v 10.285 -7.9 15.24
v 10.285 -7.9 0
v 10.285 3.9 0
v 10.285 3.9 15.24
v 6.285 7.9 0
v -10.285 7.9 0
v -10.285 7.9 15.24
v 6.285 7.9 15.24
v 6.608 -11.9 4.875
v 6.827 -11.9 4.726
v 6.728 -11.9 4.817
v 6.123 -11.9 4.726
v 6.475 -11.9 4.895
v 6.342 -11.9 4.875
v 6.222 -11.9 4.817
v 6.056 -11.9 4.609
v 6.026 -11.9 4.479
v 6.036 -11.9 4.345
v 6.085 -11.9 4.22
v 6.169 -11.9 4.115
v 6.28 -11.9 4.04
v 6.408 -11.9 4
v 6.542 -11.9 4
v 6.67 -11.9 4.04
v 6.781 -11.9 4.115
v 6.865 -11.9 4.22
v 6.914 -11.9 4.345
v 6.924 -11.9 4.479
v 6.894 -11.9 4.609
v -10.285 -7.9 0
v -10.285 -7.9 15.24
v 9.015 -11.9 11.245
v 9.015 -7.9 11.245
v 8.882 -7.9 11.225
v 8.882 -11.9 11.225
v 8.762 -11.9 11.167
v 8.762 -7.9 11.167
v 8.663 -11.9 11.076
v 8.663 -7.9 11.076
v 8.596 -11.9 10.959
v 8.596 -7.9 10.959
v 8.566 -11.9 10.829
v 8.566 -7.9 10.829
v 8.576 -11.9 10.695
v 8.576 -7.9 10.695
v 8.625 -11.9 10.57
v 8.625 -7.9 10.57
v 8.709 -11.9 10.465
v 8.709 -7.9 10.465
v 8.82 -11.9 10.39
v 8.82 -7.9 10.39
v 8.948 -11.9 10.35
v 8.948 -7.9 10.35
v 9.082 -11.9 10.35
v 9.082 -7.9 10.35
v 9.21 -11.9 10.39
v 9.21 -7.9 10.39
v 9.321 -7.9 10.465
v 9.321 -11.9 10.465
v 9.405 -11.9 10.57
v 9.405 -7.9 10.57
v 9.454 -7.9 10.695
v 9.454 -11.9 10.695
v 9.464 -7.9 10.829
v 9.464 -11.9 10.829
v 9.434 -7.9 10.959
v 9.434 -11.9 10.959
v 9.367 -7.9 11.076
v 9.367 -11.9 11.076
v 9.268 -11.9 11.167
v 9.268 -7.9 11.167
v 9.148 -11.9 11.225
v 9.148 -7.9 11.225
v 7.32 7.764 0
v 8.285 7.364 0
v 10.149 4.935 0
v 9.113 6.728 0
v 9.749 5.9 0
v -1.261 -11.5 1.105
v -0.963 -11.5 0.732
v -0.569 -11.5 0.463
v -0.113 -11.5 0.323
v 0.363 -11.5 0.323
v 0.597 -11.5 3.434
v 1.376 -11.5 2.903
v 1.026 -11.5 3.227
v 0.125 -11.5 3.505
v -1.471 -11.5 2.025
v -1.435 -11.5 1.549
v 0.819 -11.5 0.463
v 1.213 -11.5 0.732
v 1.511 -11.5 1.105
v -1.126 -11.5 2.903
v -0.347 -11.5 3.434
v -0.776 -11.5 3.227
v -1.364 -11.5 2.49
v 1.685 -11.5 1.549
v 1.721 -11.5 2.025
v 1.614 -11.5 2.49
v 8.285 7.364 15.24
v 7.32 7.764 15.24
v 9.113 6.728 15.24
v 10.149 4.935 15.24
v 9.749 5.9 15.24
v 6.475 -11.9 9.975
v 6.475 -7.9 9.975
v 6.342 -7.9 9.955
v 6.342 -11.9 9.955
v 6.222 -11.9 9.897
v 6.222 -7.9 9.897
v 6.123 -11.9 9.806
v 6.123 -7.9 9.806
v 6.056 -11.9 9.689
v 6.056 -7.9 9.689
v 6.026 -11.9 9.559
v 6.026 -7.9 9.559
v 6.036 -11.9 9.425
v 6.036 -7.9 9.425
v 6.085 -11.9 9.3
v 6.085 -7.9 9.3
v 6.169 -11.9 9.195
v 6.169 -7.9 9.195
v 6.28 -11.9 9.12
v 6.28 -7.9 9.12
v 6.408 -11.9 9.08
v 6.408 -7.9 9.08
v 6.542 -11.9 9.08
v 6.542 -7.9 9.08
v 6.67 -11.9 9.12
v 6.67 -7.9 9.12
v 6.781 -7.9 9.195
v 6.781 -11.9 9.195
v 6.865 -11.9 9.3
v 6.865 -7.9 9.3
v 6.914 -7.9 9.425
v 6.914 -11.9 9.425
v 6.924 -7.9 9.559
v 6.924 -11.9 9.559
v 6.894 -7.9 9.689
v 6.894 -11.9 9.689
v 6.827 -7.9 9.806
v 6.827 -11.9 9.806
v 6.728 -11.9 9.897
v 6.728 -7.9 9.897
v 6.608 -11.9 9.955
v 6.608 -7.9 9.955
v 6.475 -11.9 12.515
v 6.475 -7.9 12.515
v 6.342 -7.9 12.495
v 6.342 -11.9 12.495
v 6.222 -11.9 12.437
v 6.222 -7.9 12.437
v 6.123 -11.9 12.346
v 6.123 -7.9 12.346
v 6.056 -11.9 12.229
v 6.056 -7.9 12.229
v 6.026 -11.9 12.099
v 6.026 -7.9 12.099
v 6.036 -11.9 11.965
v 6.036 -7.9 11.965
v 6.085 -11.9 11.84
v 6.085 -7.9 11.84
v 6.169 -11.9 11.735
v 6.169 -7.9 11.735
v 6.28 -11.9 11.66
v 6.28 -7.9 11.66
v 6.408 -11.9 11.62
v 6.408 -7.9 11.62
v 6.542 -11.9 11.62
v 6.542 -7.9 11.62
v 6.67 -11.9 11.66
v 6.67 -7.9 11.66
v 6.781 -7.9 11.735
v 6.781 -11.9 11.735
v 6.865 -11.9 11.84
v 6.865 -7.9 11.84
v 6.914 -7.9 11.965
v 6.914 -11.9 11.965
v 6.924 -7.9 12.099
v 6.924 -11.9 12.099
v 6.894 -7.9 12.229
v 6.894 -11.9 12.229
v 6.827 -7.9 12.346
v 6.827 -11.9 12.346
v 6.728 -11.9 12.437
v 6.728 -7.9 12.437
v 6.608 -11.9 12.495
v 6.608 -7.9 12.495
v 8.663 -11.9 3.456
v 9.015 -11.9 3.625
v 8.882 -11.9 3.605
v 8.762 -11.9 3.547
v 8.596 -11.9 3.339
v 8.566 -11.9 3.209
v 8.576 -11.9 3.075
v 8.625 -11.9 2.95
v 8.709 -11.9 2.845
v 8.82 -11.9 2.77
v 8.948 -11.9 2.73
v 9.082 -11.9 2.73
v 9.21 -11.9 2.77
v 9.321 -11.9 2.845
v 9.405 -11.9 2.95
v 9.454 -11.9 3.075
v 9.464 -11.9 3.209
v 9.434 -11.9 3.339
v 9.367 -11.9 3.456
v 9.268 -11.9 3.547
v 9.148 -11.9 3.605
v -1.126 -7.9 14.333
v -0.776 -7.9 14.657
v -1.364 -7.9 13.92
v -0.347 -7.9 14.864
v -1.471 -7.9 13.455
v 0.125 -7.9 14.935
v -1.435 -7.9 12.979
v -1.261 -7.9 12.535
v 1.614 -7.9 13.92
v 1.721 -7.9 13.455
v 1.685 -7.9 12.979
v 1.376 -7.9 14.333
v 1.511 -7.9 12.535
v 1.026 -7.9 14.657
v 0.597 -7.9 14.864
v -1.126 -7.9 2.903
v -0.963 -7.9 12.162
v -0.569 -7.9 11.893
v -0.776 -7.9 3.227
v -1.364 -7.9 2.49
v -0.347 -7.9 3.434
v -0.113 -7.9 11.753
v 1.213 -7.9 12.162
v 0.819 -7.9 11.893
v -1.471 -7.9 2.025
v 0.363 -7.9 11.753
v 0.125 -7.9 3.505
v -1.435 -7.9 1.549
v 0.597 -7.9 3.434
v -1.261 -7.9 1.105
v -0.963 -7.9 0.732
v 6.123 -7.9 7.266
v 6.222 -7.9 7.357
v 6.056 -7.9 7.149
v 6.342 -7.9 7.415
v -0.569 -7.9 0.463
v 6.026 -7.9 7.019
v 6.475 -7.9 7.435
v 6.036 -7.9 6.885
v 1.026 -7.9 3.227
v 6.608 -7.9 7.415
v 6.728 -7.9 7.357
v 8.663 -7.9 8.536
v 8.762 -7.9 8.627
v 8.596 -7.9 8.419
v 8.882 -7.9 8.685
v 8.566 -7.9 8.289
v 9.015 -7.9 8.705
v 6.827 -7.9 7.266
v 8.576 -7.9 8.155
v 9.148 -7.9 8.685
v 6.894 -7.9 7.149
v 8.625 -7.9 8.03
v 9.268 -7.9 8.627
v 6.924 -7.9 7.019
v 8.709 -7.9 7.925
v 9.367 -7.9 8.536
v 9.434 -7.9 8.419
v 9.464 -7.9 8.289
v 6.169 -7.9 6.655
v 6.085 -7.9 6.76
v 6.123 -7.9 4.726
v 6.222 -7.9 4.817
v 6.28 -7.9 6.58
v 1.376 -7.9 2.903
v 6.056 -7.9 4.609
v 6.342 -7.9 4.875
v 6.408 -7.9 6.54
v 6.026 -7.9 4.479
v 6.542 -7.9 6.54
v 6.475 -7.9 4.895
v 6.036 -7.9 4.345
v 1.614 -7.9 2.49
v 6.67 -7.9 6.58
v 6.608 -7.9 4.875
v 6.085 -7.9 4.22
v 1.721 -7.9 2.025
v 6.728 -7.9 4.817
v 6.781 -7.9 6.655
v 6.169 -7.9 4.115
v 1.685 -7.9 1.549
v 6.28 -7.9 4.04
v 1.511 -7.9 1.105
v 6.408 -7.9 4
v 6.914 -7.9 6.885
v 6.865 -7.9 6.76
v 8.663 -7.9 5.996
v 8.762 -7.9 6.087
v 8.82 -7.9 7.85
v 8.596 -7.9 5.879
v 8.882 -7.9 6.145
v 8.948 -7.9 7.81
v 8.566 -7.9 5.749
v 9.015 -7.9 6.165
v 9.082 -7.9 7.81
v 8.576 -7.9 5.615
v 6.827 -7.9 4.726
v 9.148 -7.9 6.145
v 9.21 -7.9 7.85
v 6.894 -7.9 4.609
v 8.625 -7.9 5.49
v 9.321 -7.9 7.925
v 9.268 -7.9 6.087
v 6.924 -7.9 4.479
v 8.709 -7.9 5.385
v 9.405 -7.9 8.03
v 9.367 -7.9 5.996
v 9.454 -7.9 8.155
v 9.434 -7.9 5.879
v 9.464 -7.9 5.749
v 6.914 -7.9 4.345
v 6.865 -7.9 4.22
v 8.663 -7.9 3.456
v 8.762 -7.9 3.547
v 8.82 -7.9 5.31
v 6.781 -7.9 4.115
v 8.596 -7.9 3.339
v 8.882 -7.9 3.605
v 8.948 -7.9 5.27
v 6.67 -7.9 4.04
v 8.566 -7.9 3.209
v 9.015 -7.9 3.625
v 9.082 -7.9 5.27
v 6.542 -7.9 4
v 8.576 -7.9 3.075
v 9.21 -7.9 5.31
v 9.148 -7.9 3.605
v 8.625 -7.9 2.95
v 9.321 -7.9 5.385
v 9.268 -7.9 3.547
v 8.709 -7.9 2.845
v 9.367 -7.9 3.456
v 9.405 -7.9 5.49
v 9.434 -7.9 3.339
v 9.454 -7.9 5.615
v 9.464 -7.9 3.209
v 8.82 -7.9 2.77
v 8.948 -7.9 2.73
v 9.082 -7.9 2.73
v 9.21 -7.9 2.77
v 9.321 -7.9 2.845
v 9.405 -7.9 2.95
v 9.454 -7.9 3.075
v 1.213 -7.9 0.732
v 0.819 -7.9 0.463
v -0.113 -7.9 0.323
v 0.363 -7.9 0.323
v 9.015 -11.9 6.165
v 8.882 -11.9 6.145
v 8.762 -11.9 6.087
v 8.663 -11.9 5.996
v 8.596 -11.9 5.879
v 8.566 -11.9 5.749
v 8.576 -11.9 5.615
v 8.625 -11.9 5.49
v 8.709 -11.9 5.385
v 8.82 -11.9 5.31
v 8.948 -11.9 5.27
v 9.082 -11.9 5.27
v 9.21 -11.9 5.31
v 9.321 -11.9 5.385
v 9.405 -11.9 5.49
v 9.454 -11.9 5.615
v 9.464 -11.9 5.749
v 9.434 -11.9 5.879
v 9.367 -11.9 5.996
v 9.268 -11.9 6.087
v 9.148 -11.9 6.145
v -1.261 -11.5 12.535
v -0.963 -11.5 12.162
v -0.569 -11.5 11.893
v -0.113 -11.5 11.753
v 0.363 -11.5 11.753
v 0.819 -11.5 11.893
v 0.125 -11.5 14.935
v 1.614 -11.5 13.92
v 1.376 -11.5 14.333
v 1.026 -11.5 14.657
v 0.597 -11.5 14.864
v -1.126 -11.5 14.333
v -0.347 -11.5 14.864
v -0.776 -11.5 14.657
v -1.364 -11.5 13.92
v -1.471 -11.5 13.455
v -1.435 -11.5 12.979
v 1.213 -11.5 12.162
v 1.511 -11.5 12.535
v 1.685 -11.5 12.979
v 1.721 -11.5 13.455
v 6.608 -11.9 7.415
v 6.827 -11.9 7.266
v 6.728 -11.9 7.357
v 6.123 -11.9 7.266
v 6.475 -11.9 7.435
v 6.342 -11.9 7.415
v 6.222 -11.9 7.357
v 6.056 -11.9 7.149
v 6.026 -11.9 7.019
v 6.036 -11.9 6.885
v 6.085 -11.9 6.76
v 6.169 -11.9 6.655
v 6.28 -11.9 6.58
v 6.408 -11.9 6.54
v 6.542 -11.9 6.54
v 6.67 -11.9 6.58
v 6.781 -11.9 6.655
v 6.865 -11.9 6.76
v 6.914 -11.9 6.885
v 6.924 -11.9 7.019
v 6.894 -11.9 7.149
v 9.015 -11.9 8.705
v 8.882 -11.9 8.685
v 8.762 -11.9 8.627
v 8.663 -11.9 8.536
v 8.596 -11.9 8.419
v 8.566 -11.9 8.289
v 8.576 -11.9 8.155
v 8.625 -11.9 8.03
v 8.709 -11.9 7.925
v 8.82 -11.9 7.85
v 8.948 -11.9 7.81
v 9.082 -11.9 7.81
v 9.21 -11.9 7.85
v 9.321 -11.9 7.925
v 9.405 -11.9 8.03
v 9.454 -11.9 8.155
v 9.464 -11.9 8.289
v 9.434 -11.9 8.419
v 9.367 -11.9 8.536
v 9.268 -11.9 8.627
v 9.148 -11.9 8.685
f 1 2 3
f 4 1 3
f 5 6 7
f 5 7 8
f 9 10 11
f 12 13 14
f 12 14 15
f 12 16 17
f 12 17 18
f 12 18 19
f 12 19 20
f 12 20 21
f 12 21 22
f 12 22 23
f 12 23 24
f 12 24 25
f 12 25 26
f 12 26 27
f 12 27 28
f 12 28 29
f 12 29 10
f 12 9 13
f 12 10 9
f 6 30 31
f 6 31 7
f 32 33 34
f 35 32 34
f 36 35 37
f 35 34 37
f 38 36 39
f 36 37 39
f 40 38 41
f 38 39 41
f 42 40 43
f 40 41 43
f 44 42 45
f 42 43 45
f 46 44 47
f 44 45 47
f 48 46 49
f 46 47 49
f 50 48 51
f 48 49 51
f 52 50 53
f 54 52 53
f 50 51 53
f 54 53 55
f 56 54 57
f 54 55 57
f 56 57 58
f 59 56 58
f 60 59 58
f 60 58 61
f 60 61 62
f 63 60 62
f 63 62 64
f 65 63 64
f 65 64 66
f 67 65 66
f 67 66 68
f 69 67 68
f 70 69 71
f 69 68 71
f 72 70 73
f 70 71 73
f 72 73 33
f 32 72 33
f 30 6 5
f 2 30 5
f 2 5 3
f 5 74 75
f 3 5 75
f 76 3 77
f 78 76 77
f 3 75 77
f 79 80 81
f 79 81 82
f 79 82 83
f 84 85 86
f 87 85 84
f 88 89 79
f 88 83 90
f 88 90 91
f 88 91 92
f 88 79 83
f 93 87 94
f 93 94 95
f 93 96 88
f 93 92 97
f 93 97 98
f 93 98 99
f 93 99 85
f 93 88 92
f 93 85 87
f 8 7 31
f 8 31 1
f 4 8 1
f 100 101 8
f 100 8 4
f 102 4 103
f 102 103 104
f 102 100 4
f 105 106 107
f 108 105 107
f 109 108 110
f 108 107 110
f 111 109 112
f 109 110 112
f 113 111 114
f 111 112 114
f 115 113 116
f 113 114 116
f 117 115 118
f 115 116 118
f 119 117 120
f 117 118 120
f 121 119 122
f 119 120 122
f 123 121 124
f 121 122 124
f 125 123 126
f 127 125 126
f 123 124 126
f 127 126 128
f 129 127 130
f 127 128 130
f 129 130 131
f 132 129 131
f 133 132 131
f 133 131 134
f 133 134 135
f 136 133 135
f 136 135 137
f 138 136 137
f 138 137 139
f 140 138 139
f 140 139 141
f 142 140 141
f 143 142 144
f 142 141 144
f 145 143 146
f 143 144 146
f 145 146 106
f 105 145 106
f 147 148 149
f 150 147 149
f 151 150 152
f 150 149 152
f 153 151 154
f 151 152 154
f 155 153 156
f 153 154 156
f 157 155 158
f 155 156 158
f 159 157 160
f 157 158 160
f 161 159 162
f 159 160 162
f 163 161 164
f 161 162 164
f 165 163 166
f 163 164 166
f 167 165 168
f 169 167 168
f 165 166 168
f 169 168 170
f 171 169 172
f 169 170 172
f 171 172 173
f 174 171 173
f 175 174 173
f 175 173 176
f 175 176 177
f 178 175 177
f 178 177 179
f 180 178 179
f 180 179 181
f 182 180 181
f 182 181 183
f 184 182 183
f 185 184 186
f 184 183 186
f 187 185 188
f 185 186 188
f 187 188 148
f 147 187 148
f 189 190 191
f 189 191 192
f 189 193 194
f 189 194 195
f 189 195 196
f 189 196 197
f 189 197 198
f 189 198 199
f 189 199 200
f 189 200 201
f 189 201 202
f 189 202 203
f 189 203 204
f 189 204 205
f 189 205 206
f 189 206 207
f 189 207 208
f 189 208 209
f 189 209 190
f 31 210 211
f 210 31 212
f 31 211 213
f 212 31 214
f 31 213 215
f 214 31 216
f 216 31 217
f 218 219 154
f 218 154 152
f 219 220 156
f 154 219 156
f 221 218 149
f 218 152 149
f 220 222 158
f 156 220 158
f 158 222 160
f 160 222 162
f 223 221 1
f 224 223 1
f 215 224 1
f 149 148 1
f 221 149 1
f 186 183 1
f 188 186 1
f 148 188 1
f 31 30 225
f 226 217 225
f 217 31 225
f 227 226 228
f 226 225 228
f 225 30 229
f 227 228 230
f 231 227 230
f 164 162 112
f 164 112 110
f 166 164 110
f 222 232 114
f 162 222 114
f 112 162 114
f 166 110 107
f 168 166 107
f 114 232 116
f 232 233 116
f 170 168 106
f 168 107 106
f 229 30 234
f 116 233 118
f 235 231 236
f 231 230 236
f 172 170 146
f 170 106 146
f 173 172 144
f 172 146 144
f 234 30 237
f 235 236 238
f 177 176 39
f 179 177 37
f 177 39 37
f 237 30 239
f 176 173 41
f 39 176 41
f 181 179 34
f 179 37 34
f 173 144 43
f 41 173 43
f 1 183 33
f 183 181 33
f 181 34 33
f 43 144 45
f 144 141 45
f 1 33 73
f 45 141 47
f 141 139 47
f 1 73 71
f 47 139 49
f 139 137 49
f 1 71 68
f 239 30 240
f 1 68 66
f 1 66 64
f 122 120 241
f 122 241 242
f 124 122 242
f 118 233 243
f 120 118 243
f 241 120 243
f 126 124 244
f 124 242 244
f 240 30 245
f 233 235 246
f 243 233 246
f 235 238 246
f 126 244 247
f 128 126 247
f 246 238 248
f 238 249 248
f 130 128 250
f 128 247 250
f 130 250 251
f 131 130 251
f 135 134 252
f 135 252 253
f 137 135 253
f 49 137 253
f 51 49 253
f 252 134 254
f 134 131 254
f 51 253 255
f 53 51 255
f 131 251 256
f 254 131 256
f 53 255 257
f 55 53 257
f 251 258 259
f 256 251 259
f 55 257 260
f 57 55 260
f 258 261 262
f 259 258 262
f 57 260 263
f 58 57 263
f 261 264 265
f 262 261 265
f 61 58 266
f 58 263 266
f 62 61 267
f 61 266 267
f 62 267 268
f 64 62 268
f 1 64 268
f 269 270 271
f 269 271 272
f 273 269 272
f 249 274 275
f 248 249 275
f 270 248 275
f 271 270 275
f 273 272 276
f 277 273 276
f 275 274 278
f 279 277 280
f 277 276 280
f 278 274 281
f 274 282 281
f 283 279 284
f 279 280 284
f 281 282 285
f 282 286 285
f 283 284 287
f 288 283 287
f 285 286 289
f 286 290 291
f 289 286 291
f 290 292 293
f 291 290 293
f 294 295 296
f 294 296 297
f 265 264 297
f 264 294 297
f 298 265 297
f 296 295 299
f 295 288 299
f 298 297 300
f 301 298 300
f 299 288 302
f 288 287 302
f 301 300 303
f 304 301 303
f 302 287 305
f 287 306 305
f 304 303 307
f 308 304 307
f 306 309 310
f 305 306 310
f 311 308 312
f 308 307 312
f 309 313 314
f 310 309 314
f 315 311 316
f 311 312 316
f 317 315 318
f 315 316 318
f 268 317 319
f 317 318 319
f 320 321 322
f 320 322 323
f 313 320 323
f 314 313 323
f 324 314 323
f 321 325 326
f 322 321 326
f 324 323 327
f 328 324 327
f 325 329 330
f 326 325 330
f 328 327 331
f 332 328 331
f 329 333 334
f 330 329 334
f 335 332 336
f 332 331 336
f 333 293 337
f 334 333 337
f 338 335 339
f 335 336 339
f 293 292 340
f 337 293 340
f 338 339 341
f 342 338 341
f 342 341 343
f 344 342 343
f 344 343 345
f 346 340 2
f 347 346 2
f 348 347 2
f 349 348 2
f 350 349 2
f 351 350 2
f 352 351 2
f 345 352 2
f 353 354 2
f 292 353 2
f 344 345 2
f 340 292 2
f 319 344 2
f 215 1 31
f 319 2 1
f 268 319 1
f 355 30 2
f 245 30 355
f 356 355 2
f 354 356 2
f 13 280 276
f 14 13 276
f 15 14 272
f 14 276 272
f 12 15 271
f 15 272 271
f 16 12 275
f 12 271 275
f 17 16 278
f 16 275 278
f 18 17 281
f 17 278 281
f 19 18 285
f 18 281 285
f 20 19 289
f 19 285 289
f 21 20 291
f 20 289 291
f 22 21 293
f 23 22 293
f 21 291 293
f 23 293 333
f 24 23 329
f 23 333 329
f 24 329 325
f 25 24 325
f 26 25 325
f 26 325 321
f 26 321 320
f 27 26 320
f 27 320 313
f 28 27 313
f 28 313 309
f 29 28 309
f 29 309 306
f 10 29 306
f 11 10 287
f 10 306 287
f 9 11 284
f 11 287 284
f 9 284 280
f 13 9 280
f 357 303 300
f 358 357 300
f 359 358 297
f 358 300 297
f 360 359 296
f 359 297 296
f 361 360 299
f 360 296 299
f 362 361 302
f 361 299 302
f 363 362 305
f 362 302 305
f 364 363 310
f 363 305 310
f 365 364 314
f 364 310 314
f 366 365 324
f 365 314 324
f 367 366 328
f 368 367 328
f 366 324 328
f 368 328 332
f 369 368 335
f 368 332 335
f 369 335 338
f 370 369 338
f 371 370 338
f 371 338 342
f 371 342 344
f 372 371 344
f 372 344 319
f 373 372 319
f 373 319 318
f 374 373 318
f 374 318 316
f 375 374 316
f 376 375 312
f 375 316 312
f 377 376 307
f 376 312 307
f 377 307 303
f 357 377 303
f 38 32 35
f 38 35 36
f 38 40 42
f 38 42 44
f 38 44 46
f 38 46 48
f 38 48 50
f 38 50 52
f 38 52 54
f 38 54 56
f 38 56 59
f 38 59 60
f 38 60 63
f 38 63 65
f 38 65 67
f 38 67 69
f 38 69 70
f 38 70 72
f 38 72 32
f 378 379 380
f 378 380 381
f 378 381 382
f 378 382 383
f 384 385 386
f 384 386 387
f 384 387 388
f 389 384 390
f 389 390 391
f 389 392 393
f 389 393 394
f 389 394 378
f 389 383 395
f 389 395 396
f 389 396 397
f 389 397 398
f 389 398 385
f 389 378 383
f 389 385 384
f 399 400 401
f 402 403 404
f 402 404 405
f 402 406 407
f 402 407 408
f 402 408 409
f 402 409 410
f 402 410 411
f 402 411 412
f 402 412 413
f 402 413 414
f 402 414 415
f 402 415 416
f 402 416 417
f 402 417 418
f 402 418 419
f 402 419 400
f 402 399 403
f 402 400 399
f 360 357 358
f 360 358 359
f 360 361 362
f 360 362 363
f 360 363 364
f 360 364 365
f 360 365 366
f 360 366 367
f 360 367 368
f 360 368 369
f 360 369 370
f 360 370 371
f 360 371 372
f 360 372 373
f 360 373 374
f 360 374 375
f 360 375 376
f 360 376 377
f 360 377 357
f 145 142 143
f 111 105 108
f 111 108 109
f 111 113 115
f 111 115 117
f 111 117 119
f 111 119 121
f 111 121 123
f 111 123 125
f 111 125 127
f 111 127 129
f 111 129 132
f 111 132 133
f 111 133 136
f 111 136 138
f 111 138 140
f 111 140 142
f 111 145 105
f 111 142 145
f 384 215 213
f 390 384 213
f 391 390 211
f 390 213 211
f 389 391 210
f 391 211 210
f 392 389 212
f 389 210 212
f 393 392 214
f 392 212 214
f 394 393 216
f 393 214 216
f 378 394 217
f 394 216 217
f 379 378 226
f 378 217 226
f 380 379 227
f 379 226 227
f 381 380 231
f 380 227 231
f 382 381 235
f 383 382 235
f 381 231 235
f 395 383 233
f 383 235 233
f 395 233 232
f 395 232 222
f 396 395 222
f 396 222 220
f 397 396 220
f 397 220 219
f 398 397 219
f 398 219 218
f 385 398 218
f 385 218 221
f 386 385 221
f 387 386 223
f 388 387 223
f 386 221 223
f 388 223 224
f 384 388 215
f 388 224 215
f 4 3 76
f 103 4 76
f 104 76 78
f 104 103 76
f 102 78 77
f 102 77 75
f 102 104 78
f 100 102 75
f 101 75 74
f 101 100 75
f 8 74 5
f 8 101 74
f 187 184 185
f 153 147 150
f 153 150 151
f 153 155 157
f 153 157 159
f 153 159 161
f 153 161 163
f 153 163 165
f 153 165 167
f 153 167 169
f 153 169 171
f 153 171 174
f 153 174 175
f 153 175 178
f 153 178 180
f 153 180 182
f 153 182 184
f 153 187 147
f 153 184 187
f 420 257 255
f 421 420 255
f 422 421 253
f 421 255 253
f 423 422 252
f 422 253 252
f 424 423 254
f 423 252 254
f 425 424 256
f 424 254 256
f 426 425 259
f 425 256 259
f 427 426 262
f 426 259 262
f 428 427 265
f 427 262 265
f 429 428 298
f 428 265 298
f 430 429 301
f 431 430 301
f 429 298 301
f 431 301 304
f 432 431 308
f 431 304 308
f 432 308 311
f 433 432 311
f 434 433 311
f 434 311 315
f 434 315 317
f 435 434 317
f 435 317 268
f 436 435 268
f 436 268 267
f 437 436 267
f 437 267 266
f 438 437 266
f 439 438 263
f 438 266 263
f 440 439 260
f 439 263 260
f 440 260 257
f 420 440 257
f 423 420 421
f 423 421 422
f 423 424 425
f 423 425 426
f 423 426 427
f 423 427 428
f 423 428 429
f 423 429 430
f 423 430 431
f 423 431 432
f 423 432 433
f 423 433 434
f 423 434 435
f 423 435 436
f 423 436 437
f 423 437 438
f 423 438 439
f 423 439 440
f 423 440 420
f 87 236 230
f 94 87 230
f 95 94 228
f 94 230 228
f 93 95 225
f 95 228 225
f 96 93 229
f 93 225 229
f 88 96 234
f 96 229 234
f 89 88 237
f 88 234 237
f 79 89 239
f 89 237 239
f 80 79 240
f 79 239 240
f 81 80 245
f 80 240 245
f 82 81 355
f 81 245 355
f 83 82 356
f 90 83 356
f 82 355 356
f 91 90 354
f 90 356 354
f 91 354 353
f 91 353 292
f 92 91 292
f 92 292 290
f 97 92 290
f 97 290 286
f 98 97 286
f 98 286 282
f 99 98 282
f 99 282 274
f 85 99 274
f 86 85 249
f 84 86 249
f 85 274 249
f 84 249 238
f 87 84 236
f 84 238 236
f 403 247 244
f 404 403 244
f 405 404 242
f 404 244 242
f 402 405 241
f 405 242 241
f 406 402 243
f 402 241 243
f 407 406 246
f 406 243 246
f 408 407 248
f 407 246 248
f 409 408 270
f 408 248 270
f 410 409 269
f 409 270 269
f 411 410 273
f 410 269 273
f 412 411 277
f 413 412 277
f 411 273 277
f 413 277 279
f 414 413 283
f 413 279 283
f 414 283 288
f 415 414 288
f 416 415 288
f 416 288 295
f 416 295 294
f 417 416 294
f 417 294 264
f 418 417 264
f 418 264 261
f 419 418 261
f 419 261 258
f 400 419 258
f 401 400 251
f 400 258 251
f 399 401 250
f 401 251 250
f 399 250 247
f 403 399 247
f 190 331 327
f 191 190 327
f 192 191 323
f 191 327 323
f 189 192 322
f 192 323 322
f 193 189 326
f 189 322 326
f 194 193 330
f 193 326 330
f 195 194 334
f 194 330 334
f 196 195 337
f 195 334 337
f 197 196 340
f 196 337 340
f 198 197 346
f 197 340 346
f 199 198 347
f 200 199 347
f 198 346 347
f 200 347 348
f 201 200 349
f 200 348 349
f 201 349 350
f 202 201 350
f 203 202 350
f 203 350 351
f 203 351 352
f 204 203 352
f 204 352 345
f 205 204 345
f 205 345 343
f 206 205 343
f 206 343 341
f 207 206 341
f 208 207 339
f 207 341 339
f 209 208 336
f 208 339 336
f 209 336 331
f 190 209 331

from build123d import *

# Parameters (mm, degrees)
SKETCH1_W            = 20.57
SKETCH1_H            = 15.8
BOSS_EXTRUDE1_DEPTH  = 15.24
FILLET1_R            = 4
SKETCH2_R            = 1.6
BOSS_EXTRUDE2_DEPTH  = 3.6
SKETCH2_4_R          = 0.45
BOSS_EXTRUDE3_DEPTH  = 4
SKETCH2_5_R          = 0.45
BOSS_EXTRUDE4_DEPTH  = 4
LPATTERN1_COUNT      = 3
LPATTERN1_PITCH      = 2.54
LPATTERN1_COUNT_DIR2 = 2
LPATTERN1_PITCH_DIR2 = 2.54
LPATTERN2_COUNT      = 2
LPATTERN2_PITCH      = 2.54
LPATTERN2_COUNT_DIR2 = 3
LPATTERN2_PITCH_DIR2 = 2.54


with BuildPart() as part:
    # Sketch1 → Boss-Extrude1 (new body)
    with BuildSketch(Plane.XY):
        Rectangle(SKETCH1_W, SKETCH1_H)
    extrude(amount=BOSS_EXTRUDE1_DEPTH)

    # Fillet1
    fillet1_edges = [part.edges().sort_by_distance(p)[0] for p in [
        (10.285, 7.9, 7.62),
    ]]
    fillet(fillet1_edges, radius=FILLET1_R)

    # Sketch2 → Boss-Extrude2 (add)
    with BuildSketch(Plane.XZ.offset(7.9)):
        with Locations((0.125, 13.335)):
            Circle(SKETCH2_R)
        with Locations((0.125, 1.905)):
            Circle(SKETCH2_R)
    extrude(amount=BOSS_EXTRUDE2_DEPTH)

    # Sketch2<4> → Boss-Extrude3 (add)
    with BuildSketch(Plane.XZ.offset(7.9)):
        with Locations((6.475, 6.985)):
            Circle(SKETCH2_4_R)
    boss_extrude3 = extrude(amount=BOSS_EXTRUDE3_DEPTH)

    # Sketch2<5> → Boss-Extrude4 (add)
    with BuildSketch(Plane.XZ.offset(7.9)):
        with Locations((9.015, 8.255)):
            Circle(SKETCH2_5_R)
    boss_extrude4 = extrude(amount=BOSS_EXTRUDE4_DEPTH)

    # LPattern1: Boss-Extrude4 3 × 2
    with Locations(*[Vector(0, 0, -1) * (i * LPATTERN1_PITCH) + Vector(0, 0, 1) * (j * LPATTERN1_PITCH_DIR2) for i in range(LPATTERN1_COUNT) for j in range(LPATTERN1_COUNT_DIR2) if (i, j) != (0, 0)]):
        add(boss_extrude4)

    # LPattern2: Boss-Extrude3 2 × 3
    with Locations(*[Vector(0, 0, -1) * (i * LPATTERN2_PITCH) + Vector(0, 0, 1) * (j * LPATTERN2_PITCH_DIR2) for i in range(LPATTERN2_COUNT) for j in range(LPATTERN2_COUNT_DIR2) if (i, j) != (0, 0)]):
        add(boss_extrude3)


solid = part.part
